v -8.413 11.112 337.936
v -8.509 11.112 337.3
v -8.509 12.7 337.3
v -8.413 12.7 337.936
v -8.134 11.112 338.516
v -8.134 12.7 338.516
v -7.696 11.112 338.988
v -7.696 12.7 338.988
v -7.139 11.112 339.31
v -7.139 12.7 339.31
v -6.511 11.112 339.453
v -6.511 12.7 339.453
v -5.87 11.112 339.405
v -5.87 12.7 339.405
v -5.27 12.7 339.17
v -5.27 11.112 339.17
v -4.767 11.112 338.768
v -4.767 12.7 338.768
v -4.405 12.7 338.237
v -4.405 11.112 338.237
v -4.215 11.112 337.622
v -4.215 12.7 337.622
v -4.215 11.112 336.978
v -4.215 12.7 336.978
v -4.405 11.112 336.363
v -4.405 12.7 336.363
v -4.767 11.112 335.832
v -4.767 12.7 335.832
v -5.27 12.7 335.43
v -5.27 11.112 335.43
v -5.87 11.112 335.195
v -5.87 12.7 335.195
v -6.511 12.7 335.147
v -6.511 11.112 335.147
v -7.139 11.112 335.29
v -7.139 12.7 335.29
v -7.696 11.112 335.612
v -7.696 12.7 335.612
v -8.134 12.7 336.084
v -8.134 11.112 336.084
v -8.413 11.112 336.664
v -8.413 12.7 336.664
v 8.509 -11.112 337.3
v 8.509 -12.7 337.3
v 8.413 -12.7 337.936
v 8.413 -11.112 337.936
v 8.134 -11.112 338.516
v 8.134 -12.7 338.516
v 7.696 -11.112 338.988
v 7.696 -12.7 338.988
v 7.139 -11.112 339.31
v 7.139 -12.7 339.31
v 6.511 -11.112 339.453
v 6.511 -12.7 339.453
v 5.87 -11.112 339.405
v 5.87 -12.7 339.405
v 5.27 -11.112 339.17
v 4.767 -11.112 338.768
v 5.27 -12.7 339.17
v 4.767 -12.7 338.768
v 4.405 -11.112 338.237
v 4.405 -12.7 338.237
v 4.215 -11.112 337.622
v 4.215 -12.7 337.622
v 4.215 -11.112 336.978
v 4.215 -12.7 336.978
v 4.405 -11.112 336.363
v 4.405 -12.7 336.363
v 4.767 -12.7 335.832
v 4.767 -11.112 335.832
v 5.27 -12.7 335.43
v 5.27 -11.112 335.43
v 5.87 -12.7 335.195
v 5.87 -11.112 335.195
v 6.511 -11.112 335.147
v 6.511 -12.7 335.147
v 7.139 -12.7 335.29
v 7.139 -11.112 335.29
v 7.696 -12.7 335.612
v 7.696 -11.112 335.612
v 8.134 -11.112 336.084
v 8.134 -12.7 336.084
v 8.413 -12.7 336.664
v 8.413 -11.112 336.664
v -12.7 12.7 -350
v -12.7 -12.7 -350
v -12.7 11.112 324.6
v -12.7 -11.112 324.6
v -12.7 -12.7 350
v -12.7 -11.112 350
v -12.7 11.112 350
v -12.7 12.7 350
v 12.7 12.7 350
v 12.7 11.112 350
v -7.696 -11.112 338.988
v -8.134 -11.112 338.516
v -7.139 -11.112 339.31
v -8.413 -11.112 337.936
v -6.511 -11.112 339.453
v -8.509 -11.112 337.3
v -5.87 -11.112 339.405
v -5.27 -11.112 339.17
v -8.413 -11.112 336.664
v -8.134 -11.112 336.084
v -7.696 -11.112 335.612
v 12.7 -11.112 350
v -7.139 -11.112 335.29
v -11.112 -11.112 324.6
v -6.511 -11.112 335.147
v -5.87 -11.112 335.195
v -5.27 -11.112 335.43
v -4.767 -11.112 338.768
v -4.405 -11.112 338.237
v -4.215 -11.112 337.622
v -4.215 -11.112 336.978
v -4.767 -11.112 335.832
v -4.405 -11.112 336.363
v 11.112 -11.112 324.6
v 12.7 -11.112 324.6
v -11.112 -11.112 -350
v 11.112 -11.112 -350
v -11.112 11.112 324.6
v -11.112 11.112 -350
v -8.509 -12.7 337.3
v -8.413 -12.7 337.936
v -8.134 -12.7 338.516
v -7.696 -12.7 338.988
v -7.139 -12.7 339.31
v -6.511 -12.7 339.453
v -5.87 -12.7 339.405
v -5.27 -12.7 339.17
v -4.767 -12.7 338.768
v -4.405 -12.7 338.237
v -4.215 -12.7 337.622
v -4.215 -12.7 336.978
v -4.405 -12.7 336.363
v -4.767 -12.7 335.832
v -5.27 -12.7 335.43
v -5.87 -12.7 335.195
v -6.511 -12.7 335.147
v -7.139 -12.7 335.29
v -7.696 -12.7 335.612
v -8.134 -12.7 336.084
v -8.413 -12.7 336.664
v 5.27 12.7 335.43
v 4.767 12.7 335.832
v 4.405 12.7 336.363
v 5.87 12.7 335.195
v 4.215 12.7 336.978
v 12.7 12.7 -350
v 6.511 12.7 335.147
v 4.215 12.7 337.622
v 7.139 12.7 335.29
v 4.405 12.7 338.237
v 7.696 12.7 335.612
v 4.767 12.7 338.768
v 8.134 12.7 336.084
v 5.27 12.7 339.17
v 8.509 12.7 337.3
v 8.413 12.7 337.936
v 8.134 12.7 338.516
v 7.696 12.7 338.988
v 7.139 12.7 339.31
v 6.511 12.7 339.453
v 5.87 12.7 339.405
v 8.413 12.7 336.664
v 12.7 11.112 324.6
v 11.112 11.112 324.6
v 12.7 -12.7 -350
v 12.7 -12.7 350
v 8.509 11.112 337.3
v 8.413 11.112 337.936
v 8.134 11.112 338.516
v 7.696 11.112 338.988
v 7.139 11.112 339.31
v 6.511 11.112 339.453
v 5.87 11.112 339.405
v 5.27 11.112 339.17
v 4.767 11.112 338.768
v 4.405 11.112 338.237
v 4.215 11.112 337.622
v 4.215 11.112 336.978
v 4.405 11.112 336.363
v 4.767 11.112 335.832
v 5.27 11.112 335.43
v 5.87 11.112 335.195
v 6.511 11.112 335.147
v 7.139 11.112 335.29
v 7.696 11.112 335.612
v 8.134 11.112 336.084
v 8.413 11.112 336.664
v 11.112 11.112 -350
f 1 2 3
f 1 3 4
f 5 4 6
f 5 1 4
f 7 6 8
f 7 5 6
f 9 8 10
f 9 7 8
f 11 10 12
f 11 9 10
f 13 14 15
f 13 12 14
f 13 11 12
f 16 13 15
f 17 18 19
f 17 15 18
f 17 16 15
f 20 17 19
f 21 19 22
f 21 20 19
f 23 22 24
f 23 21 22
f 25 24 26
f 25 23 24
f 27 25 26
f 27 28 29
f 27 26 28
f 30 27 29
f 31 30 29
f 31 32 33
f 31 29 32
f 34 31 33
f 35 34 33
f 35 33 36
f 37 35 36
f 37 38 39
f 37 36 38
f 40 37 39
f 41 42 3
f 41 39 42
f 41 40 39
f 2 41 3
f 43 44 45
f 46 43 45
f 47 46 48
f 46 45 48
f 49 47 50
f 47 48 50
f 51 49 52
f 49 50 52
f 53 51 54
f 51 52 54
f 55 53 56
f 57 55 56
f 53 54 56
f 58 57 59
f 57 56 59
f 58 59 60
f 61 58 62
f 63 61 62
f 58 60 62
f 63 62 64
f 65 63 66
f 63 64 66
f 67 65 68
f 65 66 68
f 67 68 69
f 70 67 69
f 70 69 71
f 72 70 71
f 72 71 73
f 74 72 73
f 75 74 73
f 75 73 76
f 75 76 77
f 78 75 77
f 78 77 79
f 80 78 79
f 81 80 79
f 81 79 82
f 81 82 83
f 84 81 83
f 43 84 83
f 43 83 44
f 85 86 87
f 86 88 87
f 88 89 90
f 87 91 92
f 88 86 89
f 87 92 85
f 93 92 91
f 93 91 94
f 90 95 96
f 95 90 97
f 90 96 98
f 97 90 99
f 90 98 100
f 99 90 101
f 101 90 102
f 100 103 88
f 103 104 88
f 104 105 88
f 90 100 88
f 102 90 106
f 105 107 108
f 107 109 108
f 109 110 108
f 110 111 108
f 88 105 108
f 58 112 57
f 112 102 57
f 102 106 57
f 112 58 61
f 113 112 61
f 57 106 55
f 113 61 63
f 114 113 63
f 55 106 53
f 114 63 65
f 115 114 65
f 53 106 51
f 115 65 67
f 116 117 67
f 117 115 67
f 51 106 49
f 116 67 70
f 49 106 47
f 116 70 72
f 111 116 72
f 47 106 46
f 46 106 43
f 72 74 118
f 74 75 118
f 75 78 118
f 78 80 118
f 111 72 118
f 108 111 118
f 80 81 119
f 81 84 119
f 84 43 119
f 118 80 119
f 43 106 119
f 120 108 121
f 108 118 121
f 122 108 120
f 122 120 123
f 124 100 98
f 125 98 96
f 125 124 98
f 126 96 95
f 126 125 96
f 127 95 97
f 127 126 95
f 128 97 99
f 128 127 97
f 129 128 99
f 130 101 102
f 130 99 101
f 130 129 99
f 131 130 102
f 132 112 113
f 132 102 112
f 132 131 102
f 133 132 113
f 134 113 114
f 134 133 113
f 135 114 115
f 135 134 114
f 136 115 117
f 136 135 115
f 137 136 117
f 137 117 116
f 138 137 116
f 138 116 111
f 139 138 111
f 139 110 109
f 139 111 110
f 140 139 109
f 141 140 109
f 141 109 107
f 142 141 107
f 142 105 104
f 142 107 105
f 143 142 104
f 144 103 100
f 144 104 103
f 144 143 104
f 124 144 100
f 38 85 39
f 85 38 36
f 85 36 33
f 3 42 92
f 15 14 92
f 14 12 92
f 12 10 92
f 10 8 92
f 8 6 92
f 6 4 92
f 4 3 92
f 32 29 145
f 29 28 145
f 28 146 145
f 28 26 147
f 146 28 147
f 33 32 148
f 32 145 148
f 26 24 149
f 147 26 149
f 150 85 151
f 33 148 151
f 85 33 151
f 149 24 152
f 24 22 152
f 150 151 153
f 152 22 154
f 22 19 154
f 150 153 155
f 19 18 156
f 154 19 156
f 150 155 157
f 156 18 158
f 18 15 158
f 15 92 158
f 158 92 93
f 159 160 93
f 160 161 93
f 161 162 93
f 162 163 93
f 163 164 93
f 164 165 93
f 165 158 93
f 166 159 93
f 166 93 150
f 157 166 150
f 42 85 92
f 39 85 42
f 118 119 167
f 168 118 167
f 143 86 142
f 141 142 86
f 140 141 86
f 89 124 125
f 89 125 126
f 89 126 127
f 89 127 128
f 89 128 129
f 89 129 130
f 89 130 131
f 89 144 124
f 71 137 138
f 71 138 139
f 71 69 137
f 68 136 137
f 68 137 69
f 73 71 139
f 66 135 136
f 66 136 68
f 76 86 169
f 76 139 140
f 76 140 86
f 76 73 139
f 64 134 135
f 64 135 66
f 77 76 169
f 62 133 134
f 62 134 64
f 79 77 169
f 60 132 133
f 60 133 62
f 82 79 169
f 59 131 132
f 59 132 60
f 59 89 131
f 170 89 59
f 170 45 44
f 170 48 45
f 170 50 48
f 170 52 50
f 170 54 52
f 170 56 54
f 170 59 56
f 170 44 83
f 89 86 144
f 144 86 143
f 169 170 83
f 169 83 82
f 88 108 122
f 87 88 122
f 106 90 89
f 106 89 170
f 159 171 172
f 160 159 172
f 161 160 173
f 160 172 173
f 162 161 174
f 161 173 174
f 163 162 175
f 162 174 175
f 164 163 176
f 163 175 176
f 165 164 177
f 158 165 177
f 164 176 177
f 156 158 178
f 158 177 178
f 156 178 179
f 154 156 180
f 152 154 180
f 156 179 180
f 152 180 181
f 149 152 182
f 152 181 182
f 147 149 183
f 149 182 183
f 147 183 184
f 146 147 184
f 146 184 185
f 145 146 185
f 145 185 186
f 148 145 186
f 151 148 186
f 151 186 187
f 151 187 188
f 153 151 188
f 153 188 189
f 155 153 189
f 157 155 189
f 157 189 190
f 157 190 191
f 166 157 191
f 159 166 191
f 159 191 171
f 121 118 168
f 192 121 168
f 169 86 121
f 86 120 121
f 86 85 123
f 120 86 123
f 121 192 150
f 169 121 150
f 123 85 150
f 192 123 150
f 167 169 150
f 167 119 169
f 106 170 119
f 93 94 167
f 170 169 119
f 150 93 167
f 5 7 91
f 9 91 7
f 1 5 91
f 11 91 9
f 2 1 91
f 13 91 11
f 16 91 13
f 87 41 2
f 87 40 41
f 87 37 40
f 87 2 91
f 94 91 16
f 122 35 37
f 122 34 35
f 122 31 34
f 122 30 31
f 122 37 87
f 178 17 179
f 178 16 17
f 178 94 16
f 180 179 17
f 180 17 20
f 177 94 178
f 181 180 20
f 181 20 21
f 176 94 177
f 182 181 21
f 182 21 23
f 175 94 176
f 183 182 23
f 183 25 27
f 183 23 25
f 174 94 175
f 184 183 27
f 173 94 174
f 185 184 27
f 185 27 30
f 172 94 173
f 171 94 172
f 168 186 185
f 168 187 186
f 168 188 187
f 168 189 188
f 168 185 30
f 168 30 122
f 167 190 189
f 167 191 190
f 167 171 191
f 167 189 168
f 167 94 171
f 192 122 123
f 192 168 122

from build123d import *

# Parameters (mm, degrees)
ESQUISSE1_W             = 25.4
ESQUISSE1_H             = 25.4
ESQUISSE1_W_2           = 22.225
ESQUISSE1_H_2           = 22.225
BOSS_EXTRU_1_DEPTH      = 350
ESQUISSE2_R             = 2.159
ENL_V_MAT_EXTRU_1_DEPTH = 352.150181546
ESQUISSE3_W             = 25.4
ESQUISSE3_H             = 22.225
ENL_V_MAT_EXTRU_3_DEPTH = 352.150181546


with BuildPart() as part:
    # Esquisse1 → Boss.-Extru.1 (new, symmetric)
    with BuildSketch(Plane.XY):
        Rectangle(ESQUISSE1_W, ESQUISSE1_H)
        Rectangle(ESQUISSE1_W_2, ESQUISSE1_H_2, mode=Mode.SUBTRACT)
    extrude(amount=BOSS_EXTRU_1_DEPTH, both=True)

    # Esquisse2 → Enlèv. mat.-Extru.1 (cut, through all)
    with BuildSketch(Plane.XZ.offset(12.7)):
        with Locations((6.35, 337.3)):
            Circle(ESQUISSE2_R)
    enl_v_mat_extru_1 = extrude(amount=-ENL_V_MAT_EXTRU_1_DEPTH, mode=Mode.SUBTRACT)

    # Symétrie1: Enlèv. mat.-Extru.1 across plane
    add(enl_v_mat_extru_1.mirror(Plane(origin=(0, 0, 0), x_dir=(0, 0, 1), z_dir=(1, 0, 0))), mode=Mode.SUBTRACT)

    # Esquisse3 → Enlèv. mat.-Extru.3 (cut, through all)
    with BuildSketch(Plane(origin=(12.7, 0, 0), x_dir=(0, 0, -1), z_dir=(1, 0, 0))):
        with Locations((-337.3, 0)):
            Rectangle(ESQUISSE3_W, ESQUISSE3_H)
    extrude(amount=-ENL_V_MAT_EXTRU_3_DEPTH, mode=Mode.SUBTRACT)


solid = part.part
